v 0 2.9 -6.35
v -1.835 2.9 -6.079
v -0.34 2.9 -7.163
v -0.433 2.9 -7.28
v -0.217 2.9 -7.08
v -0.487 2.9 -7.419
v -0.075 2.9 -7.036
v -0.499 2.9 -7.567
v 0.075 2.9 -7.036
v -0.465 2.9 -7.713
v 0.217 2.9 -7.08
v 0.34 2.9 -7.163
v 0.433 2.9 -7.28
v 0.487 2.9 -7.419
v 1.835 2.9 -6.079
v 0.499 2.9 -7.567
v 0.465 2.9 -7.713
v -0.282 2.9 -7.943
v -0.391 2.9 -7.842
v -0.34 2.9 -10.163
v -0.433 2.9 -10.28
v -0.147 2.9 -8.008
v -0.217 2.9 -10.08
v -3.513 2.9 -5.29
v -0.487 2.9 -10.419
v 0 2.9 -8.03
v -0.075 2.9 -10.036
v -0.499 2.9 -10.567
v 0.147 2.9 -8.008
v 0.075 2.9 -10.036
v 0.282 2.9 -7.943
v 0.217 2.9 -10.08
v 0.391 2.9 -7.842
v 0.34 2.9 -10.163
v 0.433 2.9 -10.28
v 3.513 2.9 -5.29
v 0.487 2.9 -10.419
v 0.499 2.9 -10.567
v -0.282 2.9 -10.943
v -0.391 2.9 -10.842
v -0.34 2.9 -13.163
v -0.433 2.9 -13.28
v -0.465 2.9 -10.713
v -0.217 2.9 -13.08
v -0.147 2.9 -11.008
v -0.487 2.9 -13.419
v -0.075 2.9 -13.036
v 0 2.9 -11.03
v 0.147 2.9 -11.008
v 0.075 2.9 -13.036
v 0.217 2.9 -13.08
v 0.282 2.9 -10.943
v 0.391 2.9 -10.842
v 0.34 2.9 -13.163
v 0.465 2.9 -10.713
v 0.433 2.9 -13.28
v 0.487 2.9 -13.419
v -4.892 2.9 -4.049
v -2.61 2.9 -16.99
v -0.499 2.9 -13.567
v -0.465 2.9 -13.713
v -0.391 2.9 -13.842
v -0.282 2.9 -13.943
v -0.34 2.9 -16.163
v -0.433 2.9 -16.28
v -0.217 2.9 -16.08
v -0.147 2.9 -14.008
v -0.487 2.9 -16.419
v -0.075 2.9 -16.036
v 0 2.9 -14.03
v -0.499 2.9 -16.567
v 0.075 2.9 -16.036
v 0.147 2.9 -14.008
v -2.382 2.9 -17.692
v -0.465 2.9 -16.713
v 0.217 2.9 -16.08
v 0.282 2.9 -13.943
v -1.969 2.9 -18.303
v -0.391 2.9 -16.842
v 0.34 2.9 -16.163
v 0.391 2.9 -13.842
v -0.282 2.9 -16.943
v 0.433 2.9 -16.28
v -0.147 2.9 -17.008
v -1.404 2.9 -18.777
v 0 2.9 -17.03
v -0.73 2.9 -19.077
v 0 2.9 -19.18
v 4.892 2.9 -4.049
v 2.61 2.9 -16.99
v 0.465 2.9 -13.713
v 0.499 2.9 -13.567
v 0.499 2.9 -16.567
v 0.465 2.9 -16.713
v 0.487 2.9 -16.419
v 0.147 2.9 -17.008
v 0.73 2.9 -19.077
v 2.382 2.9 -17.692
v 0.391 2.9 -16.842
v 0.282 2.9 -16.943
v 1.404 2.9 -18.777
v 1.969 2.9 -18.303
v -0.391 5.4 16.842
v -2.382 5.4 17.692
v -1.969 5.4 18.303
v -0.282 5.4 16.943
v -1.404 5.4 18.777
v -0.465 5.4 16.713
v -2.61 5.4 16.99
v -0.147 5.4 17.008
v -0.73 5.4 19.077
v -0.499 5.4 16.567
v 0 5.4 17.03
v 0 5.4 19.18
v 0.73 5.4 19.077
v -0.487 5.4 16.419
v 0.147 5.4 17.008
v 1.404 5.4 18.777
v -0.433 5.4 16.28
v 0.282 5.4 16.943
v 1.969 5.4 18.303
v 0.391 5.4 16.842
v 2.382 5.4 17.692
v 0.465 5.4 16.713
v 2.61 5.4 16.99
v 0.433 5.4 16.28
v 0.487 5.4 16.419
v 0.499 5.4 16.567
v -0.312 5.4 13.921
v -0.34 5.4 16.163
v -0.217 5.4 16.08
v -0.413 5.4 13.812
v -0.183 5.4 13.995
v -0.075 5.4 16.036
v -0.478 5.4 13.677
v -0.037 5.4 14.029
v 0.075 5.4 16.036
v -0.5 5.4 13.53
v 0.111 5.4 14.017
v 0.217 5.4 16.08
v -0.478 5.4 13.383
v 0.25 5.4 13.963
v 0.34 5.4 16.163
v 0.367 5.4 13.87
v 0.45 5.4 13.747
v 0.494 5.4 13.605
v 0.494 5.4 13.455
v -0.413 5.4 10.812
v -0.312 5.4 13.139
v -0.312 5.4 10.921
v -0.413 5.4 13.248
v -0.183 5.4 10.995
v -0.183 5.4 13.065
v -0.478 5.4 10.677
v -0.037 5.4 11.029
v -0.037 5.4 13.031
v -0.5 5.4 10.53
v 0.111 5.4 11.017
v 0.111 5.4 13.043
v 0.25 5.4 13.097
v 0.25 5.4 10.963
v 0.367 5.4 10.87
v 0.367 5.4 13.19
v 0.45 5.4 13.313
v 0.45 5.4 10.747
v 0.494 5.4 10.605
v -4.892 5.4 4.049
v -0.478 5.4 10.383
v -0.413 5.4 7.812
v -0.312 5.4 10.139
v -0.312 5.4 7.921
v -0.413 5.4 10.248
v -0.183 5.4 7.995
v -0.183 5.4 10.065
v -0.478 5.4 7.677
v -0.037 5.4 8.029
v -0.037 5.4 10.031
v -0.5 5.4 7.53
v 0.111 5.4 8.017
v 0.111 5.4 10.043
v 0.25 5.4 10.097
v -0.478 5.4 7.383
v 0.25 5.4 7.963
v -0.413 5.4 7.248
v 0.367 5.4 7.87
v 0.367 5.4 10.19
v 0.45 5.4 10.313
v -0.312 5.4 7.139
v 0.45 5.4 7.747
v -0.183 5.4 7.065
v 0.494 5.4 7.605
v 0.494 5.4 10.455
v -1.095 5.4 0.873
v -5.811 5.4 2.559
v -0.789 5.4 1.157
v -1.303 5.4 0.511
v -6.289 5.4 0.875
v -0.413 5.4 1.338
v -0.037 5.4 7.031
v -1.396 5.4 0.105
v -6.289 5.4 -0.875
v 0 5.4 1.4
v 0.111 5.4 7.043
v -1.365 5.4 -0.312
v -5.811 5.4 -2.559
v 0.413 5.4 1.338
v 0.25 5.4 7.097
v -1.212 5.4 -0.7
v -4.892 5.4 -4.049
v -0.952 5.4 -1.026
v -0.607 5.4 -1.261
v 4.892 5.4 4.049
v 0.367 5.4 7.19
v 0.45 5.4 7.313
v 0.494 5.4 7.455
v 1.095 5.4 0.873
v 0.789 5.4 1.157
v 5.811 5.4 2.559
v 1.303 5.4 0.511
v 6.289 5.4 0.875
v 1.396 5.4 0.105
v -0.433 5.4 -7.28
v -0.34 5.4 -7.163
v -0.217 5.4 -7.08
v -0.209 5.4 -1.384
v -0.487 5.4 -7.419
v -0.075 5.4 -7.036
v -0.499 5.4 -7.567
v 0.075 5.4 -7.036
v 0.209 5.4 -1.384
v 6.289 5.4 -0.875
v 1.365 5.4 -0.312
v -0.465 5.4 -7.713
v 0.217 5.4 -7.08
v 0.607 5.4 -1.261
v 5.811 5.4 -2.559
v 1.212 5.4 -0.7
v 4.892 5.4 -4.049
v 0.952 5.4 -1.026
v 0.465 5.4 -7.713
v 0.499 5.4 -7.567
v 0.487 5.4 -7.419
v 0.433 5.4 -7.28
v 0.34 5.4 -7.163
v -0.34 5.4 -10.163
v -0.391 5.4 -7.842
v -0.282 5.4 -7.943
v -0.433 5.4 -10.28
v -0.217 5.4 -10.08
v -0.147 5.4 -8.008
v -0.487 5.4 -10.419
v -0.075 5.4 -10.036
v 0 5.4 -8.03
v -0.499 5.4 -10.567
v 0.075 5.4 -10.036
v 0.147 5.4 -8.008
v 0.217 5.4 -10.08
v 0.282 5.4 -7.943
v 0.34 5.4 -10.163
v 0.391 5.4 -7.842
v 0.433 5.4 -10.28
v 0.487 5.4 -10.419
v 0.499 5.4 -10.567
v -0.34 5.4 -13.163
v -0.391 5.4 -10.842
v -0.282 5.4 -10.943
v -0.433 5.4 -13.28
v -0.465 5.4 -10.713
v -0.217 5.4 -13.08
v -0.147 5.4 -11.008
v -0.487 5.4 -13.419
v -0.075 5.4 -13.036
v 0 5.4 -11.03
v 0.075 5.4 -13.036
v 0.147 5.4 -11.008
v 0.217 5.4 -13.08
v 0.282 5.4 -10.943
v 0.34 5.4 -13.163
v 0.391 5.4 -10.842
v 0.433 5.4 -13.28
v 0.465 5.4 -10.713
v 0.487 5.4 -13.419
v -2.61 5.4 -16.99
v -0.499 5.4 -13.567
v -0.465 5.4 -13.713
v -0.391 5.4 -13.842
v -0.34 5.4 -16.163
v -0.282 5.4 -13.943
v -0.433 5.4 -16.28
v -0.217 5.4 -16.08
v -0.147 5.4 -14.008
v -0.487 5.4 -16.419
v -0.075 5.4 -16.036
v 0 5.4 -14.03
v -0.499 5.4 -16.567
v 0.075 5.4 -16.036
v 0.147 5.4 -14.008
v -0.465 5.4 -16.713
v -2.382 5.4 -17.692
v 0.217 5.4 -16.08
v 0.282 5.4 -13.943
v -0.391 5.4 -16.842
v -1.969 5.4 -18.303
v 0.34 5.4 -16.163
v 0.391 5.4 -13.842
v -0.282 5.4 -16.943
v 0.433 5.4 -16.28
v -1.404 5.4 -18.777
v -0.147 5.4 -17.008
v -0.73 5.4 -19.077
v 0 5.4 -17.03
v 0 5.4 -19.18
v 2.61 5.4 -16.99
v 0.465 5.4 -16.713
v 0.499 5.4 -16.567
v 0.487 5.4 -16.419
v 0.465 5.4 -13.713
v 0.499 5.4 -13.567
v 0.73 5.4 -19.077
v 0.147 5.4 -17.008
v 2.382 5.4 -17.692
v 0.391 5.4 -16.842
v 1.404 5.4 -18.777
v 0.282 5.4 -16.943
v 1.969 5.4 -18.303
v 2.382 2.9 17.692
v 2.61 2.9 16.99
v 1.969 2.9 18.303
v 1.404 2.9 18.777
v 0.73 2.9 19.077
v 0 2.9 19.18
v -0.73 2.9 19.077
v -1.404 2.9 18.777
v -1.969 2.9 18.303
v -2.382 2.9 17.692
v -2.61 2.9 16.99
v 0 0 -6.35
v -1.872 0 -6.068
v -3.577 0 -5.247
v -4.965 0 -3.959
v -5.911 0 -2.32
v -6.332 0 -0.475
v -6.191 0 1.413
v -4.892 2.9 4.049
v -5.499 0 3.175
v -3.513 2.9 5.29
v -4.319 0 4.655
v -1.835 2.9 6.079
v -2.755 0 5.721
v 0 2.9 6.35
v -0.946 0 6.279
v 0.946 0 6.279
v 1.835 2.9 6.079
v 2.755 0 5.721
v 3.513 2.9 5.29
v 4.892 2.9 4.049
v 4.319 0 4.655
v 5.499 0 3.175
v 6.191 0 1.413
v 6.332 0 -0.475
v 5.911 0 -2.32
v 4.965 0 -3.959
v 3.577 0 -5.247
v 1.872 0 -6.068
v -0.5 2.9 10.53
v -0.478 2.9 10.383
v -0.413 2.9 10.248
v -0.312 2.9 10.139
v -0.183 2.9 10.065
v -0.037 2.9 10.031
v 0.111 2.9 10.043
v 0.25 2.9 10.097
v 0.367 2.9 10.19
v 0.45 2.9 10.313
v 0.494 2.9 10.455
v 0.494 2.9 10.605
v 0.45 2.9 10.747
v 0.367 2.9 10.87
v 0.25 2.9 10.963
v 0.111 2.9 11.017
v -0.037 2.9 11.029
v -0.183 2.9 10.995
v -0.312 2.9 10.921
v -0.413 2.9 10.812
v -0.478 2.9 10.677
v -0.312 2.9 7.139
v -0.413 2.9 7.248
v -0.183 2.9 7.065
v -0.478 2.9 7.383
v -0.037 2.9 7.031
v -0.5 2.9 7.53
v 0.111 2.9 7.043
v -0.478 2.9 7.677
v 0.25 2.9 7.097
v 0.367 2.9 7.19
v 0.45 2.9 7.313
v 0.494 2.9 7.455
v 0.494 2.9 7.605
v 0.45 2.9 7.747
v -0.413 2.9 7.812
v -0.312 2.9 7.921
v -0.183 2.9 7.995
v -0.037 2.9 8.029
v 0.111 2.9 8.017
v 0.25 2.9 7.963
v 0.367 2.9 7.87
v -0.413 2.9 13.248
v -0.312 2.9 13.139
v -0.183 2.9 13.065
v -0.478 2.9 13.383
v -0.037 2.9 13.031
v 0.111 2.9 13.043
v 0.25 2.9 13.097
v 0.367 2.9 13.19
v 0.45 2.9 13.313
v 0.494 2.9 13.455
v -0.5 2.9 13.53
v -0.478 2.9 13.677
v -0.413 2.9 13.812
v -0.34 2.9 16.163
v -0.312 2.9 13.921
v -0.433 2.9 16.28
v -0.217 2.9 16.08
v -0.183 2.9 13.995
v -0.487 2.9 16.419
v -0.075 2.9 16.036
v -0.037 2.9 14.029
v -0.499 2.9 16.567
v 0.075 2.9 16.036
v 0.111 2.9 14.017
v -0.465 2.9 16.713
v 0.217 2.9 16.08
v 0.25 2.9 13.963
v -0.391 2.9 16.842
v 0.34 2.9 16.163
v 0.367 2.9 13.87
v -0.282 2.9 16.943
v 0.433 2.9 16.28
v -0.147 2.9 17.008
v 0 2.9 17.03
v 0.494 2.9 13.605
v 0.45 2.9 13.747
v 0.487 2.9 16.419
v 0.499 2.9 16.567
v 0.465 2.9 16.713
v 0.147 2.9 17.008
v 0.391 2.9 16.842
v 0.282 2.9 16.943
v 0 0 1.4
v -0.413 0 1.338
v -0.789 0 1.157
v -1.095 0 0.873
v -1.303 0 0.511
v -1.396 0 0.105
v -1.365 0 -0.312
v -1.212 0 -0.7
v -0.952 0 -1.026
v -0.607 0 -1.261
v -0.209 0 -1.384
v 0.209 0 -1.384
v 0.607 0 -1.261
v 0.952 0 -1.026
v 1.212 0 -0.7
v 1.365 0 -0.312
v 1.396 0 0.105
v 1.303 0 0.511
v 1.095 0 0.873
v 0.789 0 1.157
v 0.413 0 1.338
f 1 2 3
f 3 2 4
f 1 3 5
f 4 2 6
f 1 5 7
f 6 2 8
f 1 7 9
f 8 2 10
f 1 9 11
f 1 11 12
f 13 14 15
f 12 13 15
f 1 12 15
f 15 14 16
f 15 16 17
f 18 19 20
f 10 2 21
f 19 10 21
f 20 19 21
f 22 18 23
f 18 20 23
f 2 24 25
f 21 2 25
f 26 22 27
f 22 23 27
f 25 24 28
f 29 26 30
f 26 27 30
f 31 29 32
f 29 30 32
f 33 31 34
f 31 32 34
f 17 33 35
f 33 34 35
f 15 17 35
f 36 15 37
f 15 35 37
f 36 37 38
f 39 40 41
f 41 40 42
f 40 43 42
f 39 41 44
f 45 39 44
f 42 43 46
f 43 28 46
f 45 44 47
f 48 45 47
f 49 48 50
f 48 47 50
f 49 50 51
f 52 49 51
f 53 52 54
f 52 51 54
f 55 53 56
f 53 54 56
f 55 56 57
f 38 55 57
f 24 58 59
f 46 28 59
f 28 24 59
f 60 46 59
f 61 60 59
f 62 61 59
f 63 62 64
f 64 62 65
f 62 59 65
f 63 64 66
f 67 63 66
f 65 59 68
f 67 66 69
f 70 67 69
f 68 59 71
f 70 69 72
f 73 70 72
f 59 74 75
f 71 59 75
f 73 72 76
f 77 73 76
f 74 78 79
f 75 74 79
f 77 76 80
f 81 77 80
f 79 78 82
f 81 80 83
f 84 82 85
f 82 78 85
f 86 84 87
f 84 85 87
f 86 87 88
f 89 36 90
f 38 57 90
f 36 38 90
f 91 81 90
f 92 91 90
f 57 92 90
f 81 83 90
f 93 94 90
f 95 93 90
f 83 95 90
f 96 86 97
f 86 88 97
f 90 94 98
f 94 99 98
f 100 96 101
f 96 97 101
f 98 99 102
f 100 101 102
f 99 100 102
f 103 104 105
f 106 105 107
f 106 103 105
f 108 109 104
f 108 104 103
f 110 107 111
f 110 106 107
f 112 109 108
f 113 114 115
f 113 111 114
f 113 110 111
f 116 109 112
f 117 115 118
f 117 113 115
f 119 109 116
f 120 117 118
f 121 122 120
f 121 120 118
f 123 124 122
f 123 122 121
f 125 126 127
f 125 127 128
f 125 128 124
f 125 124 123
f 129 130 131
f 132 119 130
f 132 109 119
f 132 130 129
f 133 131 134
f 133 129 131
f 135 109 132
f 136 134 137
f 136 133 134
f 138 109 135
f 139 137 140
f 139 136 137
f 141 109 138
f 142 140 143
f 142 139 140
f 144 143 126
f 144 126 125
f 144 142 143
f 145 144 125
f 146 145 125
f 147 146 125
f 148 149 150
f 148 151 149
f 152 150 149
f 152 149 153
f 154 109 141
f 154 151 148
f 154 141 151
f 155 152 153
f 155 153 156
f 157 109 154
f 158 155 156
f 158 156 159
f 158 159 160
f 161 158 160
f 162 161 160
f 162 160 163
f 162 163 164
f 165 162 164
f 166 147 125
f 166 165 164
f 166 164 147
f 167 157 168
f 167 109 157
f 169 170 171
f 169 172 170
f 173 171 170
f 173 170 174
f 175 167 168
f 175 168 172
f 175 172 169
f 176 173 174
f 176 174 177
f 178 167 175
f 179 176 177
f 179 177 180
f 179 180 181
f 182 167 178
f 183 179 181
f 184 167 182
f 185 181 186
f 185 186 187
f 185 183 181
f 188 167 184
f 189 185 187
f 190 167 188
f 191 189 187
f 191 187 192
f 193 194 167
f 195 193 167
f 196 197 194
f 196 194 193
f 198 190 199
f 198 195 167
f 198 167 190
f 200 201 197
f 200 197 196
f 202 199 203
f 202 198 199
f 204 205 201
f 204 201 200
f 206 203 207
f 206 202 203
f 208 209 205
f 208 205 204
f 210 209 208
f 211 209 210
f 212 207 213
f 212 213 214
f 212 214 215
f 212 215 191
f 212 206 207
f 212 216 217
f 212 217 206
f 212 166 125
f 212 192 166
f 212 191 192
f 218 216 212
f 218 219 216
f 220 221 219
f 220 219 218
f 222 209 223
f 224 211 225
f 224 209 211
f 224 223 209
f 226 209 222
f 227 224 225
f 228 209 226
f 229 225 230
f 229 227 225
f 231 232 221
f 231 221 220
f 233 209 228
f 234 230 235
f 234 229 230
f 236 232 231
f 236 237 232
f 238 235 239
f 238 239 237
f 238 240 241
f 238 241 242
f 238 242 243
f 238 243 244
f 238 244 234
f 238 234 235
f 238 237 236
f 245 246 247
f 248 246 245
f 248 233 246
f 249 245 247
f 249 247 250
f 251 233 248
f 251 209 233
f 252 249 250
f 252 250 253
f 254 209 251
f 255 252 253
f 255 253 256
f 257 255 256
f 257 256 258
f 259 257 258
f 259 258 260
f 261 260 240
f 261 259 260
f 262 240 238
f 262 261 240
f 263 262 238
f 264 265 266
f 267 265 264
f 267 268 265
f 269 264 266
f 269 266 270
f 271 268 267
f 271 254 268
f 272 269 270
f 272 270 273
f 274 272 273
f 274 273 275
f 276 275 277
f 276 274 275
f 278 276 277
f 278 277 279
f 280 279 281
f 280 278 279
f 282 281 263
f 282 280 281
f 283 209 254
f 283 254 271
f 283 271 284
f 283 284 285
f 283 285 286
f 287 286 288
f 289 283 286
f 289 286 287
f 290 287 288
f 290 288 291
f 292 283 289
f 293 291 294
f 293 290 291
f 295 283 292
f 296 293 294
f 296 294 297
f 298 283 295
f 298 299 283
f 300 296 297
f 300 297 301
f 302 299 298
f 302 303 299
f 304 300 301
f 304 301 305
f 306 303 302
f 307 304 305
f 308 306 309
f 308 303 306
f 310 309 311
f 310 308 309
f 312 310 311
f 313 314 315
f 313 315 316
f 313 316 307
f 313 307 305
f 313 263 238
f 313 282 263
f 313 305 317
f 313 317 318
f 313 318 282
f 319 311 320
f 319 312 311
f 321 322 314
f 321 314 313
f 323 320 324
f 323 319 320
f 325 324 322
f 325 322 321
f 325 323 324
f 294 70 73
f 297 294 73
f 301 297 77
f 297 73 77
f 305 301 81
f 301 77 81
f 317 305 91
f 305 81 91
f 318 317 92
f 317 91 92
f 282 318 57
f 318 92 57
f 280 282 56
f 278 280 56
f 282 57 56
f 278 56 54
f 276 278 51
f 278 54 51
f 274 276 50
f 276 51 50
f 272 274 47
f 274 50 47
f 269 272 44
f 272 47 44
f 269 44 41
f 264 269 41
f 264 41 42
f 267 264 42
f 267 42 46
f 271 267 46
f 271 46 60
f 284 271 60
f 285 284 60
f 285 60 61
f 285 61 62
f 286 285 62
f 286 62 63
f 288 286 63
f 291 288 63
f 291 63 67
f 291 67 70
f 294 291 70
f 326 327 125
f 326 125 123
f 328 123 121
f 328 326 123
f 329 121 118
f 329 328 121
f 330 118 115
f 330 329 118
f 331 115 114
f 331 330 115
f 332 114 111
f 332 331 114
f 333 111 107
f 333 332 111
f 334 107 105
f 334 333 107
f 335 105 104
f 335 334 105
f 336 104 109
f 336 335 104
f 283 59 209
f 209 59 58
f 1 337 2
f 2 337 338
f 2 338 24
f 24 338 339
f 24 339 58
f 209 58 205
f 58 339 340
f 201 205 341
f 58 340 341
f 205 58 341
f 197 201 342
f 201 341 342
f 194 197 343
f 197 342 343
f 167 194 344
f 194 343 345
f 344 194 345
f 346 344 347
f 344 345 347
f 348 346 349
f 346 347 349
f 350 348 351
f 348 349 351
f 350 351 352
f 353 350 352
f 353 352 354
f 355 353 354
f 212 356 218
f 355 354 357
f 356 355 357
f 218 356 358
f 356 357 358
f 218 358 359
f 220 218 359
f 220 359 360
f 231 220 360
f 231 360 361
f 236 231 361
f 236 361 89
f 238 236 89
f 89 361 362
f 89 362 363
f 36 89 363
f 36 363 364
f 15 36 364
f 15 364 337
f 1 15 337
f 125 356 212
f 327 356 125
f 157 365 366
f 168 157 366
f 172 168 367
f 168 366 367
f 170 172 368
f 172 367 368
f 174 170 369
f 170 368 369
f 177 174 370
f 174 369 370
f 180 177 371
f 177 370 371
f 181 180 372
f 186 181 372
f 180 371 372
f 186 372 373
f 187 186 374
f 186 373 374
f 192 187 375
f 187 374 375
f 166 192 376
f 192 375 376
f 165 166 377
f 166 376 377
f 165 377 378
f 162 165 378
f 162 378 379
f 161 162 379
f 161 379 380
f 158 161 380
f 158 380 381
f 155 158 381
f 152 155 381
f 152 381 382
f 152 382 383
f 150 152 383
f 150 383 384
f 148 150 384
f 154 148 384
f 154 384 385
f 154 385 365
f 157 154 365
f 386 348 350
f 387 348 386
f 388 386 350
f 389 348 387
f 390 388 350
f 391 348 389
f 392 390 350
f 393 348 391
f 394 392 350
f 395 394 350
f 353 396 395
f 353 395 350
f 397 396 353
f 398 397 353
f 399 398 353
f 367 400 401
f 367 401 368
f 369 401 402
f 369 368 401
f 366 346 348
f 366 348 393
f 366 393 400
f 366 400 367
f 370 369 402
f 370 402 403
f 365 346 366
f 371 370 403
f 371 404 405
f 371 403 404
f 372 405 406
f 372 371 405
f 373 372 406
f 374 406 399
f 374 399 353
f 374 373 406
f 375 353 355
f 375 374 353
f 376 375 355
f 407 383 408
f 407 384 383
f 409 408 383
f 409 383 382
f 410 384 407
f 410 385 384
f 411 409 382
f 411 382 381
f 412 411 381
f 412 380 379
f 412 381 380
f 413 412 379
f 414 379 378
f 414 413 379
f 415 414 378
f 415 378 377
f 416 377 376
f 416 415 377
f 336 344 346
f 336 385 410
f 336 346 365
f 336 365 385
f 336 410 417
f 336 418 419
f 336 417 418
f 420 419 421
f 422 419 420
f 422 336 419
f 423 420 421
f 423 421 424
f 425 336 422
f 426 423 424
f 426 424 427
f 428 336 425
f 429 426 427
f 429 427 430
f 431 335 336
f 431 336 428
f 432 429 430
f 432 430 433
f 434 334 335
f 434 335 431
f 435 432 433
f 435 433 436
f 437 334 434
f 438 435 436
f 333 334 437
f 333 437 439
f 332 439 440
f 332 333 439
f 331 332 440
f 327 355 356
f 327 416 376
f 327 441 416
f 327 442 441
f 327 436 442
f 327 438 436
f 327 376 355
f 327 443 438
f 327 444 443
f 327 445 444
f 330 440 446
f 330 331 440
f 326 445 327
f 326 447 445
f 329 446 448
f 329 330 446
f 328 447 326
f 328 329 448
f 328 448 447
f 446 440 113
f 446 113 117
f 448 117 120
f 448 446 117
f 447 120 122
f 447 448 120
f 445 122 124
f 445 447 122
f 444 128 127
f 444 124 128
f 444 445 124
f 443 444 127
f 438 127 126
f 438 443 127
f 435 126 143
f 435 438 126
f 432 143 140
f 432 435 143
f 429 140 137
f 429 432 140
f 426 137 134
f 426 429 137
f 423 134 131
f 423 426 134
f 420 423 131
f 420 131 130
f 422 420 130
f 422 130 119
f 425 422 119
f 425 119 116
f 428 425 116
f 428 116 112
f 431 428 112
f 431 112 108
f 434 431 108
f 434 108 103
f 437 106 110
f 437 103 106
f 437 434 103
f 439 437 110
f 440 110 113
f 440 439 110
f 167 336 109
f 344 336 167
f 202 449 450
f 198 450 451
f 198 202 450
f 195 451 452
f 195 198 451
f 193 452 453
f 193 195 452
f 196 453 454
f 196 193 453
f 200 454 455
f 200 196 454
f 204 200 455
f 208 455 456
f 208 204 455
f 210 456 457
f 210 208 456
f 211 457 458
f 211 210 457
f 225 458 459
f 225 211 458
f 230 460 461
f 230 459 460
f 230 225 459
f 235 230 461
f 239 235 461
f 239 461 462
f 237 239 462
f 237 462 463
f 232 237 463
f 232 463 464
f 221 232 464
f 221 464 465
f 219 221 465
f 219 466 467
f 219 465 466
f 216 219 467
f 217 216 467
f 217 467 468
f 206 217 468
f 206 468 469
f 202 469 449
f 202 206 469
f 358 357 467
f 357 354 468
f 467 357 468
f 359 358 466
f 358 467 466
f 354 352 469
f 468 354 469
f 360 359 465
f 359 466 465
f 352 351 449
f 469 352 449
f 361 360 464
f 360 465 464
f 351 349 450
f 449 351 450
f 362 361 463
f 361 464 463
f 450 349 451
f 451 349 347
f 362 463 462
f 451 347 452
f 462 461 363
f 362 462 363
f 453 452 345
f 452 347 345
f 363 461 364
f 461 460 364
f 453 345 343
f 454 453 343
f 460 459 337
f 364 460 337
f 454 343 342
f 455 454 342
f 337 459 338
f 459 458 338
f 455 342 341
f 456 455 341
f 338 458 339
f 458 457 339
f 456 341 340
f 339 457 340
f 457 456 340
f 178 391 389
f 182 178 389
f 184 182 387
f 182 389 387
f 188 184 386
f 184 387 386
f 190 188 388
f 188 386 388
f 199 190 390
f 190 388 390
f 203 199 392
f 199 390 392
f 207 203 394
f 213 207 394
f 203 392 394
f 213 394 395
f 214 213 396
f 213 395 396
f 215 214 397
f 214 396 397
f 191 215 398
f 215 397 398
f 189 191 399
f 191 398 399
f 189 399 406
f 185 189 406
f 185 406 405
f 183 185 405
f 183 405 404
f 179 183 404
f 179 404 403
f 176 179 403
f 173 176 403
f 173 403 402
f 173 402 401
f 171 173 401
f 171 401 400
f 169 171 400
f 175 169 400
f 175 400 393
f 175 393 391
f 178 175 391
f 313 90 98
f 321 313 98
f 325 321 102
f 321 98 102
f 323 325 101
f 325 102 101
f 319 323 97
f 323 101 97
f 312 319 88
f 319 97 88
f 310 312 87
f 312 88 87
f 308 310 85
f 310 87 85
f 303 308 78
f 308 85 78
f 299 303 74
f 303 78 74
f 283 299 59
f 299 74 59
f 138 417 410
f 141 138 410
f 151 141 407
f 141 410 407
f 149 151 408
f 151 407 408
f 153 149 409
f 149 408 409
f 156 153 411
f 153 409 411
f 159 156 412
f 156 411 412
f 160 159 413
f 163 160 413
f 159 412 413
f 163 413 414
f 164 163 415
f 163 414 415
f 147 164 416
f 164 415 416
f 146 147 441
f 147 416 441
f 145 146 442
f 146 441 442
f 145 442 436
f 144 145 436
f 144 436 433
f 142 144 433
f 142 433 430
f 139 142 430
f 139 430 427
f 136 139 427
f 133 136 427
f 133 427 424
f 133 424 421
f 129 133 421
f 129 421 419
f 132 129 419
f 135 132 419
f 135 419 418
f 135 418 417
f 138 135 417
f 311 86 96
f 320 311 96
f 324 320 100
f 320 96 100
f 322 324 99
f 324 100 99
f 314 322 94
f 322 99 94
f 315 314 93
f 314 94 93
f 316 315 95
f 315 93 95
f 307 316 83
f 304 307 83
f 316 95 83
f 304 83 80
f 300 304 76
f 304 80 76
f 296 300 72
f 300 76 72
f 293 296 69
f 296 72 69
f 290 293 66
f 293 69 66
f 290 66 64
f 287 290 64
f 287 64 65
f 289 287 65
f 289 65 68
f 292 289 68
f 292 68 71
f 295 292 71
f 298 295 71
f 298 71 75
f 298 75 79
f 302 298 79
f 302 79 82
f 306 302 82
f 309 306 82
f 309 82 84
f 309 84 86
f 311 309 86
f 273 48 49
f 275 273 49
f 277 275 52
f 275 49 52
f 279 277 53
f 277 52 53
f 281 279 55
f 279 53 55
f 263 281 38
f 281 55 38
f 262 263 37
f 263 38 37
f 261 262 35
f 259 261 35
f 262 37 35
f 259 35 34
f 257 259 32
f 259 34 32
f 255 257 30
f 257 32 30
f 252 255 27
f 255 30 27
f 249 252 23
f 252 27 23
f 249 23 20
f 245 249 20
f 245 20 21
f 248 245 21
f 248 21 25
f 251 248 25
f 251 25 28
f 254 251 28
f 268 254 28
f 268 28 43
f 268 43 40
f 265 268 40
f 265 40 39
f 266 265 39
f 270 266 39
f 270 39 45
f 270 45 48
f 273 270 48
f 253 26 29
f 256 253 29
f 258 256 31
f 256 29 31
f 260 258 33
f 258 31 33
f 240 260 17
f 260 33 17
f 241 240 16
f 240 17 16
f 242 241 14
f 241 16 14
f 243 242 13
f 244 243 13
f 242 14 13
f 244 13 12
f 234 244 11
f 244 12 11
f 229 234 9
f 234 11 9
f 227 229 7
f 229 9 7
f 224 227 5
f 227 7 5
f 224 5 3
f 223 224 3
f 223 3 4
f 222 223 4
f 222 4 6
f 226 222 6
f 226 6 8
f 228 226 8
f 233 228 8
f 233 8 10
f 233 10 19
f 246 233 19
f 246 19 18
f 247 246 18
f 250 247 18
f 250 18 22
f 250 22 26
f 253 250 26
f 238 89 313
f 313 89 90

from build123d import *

# Parameters (mm, degrees)
SKETCH1_R               = 6.35
BOSS_EXTRUDE1_DEPTH     = 5.4
HORN_START              = -2.5
HORN_DEPTH              = 2.5
SKETCH4_R               = 1.4
CUT_EXTRUDE1_DEPTH      = 21.913031822
SKETCH5_R               = 0.5
CUT_EXTRUDE2_DEPTH      = 21.913031822
LPATTERN1_COUNT         = 4
LPATTERN1_PITCH         = 3
MIRROR1_COPY_1_SKETCH_R = 0.5
MIRROR1_COPY_1_DEPTH    = 21.913031822
MIRROR1_COPY_2_SKETCH_R = 0.5
MIRROR1_COPY_2_DEPTH    = 21.913031822
MIRROR1_COPY_3_SKETCH_R = 0.5
MIRROR1_COPY_3_DEPTH    = 21.913031822


with BuildPart() as part:
    # Sketch1 → Boss-Extrude1 (new body)
    with BuildSketch(Plane(origin=(0, 0, 0), x_dir=(1, 0, 0), z_dir=(0, 1, 0))):
        with Locations(Location((0, 0, 0), (0, 0, 90))):
            Circle(SKETCH1_R)
    extrude(amount=BOSS_EXTRUDE1_DEPTH)

    # Sketch2 → horn (add)
    with BuildSketch(Plane(origin=(0, 5.4, 0), x_dir=(1, 0, 0), z_dir=(0, 1, 0)).offset(HORN_START)):
        with BuildLine():
            Line((-2.609740545, 16.990167671), (-4.891612682, 4.049027706))
            ThreePointArc((-4.891612682, 4.049027706), (0, 6.35), (4.891612682, 4.049027706))
            Line((4.891612682, 4.049027706), (2.609740545, 16.990167671))
            ThreePointArc((2.609740545, 16.990167671), (0, 19.18), (-2.609740545, 16.990167671))
        make_face()
    horn = extrude(amount=HORN_DEPTH)

    # Sketch4 → Cut-Extrude1 (cut, through all)
    with BuildSketch(Plane(origin=(0, 5.4, 0), x_dir=(-1, 0, 0), z_dir=(0, -1, 0))):
        with Locations(Location((0, 0, 0), (0, 0, 270))):
            Circle(SKETCH4_R)
    extrude(amount=CUT_EXTRUDE1_DEPTH, mode=Mode.SUBTRACT)

    # Sketch5 → Cut-Extrude2 (cut, through all)
    with BuildSketch(Plane(origin=(0, 0, 0), x_dir=(-1, 0, 0), z_dir=(0, -1, 0))):
        with Locations(Location((0, 16.53, 0), (0, 0, 90))):
            Circle(SKETCH5_R)
    cut_extrude2 = extrude(amount=-CUT_EXTRUDE2_DEPTH, mode=Mode.SUBTRACT)

    # LPattern1: Cut-Extrude2 ×4
    with Locations(*[(0, 0, i * LPATTERN1_PITCH) for i in range(1, LPATTERN1_COUNT)]):
        add(cut_extrude2, mode=Mode.SUBTRACT)

    # Mirror1: horn, Cut-Extrude2 across plane
    add(horn.mirror(Plane.XY))
    add(cut_extrude2.mirror(Plane.XY), mode=Mode.SUBTRACT)

    # Mirror1 copy 1 sketch → Mirror1 copy 1 (cut, through all)
    with BuildSketch(Plane(origin=(0, 0, -3), x_dir=(-1, 0, 0), z_dir=(0, -1, 0))):
        with Locations((0, -16.53)):
            Circle(MIRROR1_COPY_1_SKETCH_R)
    extrude(amount=-MIRROR1_COPY_1_DEPTH, mode=Mode.SUBTRACT)

    # Mirror1 copy 2 sketch → Mirror1 copy 2 (cut, through all)
    with BuildSketch(Plane(origin=(0, 0, -6), x_dir=(-1, 0, 0), z_dir=(0, -1, 0))):
        with Locations((0, -16.53)):
            Circle(MIRROR1_COPY_2_SKETCH_R)
    extrude(amount=-MIRROR1_COPY_2_DEPTH, mode=Mode.SUBTRACT)

    # Mirror1 copy 3 sketch → Mirror1 copy 3 (cut, through all)
    with BuildSketch(Plane(origin=(0, 0, -9), x_dir=(-1, 0, 0), z_dir=(0, -1, 0))):
        with Locations((0, -16.53)):
            Circle(MIRROR1_COPY_3_SKETCH_R)
    extrude(amount=-MIRROR1_COPY_3_DEPTH, mode=Mode.SUBTRACT)


solid = part.part
